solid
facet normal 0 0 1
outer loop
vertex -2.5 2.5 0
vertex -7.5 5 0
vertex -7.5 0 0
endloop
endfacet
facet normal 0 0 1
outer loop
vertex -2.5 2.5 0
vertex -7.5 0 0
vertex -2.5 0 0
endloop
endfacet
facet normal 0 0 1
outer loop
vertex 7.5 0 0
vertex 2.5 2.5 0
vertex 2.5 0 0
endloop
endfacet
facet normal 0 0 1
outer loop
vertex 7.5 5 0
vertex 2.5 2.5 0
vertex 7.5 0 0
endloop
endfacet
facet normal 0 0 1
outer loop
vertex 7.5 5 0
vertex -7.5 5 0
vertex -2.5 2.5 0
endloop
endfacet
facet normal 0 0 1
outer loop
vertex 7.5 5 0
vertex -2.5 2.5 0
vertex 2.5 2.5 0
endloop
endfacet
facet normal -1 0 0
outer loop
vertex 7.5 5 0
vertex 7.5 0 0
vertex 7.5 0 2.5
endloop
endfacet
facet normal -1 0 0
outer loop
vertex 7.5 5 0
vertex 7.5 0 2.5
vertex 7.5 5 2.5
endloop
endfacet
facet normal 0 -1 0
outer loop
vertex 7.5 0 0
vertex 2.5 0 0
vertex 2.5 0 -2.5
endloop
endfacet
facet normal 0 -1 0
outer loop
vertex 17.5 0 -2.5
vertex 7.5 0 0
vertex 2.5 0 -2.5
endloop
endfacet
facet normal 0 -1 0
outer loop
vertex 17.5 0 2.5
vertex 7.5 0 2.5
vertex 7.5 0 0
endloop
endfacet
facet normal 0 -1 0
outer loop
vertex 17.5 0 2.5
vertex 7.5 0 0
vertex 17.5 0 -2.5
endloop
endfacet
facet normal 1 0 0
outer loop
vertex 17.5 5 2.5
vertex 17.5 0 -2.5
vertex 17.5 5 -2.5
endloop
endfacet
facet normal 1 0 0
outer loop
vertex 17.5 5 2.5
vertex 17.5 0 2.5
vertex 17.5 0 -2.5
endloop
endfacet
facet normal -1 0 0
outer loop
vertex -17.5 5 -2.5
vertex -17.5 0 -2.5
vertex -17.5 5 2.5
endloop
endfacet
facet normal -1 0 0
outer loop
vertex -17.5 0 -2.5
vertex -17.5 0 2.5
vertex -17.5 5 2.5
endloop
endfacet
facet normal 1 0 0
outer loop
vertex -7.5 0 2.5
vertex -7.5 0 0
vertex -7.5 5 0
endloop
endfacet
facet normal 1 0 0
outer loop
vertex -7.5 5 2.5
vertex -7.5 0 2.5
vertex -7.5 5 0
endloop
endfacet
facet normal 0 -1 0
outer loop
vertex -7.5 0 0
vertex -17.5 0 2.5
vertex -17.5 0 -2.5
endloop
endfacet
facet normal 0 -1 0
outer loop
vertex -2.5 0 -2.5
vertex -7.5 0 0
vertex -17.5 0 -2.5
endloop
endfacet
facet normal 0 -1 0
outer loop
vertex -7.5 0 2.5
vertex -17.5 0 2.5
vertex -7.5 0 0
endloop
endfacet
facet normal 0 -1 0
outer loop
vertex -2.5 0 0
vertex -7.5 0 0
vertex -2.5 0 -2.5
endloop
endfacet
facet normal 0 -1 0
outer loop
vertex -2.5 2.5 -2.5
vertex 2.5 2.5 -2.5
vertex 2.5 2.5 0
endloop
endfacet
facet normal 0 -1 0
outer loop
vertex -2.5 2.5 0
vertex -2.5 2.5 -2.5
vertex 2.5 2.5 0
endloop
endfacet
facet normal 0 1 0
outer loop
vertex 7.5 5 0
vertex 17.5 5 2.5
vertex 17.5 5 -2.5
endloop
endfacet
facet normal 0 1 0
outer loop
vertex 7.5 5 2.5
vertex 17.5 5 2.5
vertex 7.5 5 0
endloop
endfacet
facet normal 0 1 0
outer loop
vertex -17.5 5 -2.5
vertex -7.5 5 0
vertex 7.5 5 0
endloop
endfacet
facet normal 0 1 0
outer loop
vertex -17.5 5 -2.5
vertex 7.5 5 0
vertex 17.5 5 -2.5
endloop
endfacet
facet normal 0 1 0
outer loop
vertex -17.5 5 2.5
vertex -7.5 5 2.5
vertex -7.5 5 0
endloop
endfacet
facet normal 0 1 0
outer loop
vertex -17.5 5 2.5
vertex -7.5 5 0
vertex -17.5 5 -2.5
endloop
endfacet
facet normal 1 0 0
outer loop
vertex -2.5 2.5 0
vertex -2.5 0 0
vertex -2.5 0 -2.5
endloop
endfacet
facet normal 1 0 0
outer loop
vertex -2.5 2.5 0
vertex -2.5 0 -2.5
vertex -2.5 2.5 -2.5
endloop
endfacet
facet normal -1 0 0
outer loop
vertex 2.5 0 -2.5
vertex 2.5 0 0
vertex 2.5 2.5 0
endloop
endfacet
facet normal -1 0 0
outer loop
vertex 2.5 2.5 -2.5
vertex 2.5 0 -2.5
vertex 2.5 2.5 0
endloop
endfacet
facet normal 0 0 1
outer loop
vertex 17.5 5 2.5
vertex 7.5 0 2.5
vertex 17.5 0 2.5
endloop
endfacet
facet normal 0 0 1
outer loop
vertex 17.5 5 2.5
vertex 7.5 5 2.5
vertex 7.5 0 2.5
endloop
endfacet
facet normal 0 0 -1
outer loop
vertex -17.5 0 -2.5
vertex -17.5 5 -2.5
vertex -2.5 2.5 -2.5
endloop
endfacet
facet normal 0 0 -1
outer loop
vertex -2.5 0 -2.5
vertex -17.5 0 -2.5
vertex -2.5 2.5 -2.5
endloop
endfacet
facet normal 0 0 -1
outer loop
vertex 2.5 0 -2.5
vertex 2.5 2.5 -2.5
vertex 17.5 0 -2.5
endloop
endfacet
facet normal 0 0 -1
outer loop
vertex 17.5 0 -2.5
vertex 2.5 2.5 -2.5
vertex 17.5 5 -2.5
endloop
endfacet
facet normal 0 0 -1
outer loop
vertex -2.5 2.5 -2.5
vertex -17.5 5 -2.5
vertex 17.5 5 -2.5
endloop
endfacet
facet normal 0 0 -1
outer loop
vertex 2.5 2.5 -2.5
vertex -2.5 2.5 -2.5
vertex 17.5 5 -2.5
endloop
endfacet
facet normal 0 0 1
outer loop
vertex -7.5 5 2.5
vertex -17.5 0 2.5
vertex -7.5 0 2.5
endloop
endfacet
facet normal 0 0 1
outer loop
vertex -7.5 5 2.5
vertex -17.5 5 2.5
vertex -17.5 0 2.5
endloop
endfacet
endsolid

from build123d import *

# Parameters (mm, degrees)
F0_W     = 17.5
F0_H     = 5
F1_DEPTH = 2.5
F2_W     = 7.5
F2_H     = 5
F3_DEPTH = 2.5
F4_W     = 2.5
F4_H     = 2.5
F5_DEPTH = 2.5


with BuildPart() as f1:
    # F0 (on Top) → F1 (new body, symmetric)
    with BuildSketch(Plane.XY):
        with Locations((8.75, 2.5)):
            Rectangle(F0_W, F0_H)
        with Locations((-8.75, 2.5)):
            Rectangle(F0_W, F0_H)
    extrude(amount=F1_DEPTH, both=True)

    # F2 (on Top) → F3 (cut)
    with BuildSketch(Plane.XY):
        with Locations((3.75, 2.5)):
            Rectangle(F2_W, F2_H)
        with Locations((-3.75, 2.5)):
            Rectangle(F2_W, F2_H)
    extrude(amount=F3_DEPTH, mode=Mode.SUBTRACT)

    # F4 (on Right) → F5 (cut, symmetric)
    with BuildSketch(Plane.YZ):
        with Locations((1.25, -1.25)):
            Rectangle(F4_W, F4_H)
    extrude(amount=F5_DEPTH, both=True, mode=Mode.SUBTRACT)


solid = f1.part
